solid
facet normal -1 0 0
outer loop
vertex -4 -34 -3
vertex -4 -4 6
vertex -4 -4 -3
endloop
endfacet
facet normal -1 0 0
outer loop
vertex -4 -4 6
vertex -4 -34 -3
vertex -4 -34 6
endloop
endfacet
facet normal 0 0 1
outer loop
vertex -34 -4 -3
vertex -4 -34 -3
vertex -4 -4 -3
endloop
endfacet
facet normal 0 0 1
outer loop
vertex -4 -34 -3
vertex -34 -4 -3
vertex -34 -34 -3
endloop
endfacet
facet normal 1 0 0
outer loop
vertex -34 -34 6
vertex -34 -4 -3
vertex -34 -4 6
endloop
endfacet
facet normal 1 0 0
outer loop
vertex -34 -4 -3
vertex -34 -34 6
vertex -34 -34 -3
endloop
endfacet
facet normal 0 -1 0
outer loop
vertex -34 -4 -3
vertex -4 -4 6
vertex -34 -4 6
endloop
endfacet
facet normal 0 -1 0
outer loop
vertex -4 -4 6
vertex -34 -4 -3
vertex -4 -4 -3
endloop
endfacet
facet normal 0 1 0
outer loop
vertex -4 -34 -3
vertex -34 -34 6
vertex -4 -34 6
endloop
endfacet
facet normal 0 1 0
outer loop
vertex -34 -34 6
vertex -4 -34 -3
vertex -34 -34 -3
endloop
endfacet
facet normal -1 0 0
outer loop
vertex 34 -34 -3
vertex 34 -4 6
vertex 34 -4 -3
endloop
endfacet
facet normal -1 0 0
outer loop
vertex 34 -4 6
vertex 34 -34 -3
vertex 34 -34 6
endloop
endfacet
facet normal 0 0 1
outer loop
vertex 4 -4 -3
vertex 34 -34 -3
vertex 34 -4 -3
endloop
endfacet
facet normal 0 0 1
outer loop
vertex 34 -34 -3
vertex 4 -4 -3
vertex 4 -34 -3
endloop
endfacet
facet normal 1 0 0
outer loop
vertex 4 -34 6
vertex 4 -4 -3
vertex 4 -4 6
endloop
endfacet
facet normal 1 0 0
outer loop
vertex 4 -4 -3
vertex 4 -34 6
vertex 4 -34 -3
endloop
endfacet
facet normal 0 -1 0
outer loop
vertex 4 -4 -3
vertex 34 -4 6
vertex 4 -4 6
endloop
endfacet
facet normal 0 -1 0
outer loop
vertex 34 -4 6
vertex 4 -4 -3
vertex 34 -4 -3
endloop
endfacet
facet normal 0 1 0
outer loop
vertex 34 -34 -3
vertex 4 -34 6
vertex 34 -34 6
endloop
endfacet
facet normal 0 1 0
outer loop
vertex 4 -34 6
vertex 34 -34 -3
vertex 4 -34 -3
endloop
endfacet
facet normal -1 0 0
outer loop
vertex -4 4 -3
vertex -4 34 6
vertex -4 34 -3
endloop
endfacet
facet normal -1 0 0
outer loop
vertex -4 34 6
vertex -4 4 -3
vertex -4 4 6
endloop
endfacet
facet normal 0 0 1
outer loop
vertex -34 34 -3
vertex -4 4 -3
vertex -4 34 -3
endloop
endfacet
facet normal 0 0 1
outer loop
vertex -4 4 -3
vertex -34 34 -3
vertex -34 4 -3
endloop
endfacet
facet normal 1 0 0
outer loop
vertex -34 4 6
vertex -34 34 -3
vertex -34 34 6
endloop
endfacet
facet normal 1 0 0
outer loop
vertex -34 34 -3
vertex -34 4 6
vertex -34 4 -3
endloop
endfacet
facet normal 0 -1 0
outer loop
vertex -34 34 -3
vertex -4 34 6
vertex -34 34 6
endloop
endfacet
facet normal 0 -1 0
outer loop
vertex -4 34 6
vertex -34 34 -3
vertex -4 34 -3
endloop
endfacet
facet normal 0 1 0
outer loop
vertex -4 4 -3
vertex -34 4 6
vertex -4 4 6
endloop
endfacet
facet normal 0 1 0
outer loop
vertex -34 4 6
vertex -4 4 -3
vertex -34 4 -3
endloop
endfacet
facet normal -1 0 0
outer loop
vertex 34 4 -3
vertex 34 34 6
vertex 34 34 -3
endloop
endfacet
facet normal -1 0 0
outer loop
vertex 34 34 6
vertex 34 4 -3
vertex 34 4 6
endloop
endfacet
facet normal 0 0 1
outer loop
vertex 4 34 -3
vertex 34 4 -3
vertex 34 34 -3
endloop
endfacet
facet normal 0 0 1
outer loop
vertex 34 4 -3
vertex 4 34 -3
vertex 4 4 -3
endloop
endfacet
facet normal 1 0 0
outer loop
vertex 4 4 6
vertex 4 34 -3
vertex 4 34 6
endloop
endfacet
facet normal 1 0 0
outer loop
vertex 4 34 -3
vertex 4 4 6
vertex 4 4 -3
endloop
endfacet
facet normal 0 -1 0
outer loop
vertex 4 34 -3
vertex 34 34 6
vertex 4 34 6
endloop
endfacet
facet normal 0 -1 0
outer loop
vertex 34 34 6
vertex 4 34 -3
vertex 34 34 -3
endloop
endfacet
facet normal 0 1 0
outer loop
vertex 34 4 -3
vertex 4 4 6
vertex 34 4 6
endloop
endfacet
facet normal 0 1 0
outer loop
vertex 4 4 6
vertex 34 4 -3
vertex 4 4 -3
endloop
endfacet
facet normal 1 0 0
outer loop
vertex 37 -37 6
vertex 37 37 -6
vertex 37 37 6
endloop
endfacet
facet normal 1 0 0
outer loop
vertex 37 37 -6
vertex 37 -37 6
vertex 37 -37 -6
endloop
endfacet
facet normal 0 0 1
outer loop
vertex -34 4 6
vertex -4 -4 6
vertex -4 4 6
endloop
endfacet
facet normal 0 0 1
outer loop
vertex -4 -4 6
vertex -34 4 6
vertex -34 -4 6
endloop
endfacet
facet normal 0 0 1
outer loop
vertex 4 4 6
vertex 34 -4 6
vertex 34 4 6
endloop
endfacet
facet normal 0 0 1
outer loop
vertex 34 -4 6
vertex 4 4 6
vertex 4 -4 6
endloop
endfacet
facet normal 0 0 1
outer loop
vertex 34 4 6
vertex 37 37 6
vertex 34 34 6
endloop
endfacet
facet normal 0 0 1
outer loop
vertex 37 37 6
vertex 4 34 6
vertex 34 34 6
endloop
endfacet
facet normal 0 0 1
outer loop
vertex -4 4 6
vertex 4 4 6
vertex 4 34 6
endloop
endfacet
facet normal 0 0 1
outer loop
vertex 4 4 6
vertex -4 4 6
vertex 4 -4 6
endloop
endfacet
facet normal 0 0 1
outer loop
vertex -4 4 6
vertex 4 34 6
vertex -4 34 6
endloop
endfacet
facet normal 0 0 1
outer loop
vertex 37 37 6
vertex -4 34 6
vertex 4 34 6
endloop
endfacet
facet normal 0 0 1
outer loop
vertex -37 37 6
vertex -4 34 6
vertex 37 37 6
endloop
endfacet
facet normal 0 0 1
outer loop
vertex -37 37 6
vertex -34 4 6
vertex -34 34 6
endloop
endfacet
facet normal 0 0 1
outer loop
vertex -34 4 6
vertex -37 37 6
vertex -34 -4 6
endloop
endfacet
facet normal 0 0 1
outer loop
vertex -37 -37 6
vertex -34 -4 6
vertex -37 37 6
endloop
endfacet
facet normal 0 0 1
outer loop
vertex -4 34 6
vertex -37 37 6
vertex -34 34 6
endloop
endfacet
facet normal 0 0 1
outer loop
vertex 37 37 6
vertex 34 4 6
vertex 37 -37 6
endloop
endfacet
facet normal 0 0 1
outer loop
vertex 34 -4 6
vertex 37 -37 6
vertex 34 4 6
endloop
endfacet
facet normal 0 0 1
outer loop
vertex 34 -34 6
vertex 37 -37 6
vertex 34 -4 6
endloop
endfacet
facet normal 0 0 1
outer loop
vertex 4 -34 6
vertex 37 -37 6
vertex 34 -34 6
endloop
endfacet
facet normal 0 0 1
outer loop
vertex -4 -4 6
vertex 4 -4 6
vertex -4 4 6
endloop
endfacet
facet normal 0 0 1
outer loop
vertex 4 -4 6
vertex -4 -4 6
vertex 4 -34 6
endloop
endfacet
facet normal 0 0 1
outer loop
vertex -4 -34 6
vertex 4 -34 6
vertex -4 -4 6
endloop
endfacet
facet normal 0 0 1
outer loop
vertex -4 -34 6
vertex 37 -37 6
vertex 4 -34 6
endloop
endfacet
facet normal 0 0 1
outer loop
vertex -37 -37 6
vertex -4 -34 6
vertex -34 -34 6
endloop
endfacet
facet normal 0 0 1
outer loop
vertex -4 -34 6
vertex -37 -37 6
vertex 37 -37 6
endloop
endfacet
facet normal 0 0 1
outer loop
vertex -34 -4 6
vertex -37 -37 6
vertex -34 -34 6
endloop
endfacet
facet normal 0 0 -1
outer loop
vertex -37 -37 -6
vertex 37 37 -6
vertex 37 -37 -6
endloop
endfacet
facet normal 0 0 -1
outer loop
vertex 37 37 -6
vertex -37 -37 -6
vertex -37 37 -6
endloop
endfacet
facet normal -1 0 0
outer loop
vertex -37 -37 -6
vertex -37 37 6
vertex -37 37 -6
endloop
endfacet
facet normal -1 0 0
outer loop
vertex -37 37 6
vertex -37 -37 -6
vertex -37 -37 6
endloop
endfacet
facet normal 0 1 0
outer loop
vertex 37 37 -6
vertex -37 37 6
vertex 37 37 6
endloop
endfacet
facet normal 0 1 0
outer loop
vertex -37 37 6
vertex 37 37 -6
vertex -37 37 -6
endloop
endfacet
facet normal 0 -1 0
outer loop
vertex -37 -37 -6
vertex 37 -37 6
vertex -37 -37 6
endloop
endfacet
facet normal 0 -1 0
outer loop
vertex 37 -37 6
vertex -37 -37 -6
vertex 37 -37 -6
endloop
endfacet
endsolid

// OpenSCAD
$fn = 32;

// ----------------------------------------------------------------------
// Pocket plate 74 x 74 x 12
// 2 x 2 pockets 30 mm square, 9 mm deep
// ----------------------------------------------------------------------

// --- parameters (mm) ---
thickness = 12;  // plate thickness
floor_t = 3;     // material left under each pocket
pocket = 30;     // pocket side length
pitch_x = 38;    // pocket pitch along X
pitch_y = 38;    // pocket pitch along Y
cols = 2;        // pockets per row
rows = 2;        // rows of pockets

// --- derived feature positions (mm) ---
depth = thickness - floor_t;        // = 9   pocket depth, down to the floor
span_x = (cols - 1) * pitch_x;      // = 38   distance between outer pockets
span_y = (rows - 1) * pitch_y;      // = 38   distance between outer pocket rows
origin_x = -span_x / 2;             // = -19   X of the first pocket
origin_y = -span_y / 2;             // = -19   Y of the first pocket
plate = [span_x + pocket + 6, span_y + pocket + 6, thickness];  // = [74, 74, 12]   overall size: pockets plus 3 mm of wall on each side
feature_centers = [
  [origin_x + 0 * pitch_x, origin_y + 0 * pitch_y],
  [origin_x + 1 * pitch_x, origin_y + 0 * pitch_y],
  [origin_x + 0 * pitch_x, origin_y + 1 * pitch_y],
  [origin_x + 1 * pitch_x, origin_y + 1 * pitch_y]
];   // pocket centres, used verbatim by the cutter loop

// plate outline, then one pocket per centre in feature_centers
difference() {
  cube(plate, center = true);
  for (centre = feature_centers)
    translate([centre[0] - pocket / 2, centre[1] - pocket / 2, plate[2] / 2 - depth])
      cube([pocket, pocket, depth + 1]);  // centred on the declared pocket centre
}
